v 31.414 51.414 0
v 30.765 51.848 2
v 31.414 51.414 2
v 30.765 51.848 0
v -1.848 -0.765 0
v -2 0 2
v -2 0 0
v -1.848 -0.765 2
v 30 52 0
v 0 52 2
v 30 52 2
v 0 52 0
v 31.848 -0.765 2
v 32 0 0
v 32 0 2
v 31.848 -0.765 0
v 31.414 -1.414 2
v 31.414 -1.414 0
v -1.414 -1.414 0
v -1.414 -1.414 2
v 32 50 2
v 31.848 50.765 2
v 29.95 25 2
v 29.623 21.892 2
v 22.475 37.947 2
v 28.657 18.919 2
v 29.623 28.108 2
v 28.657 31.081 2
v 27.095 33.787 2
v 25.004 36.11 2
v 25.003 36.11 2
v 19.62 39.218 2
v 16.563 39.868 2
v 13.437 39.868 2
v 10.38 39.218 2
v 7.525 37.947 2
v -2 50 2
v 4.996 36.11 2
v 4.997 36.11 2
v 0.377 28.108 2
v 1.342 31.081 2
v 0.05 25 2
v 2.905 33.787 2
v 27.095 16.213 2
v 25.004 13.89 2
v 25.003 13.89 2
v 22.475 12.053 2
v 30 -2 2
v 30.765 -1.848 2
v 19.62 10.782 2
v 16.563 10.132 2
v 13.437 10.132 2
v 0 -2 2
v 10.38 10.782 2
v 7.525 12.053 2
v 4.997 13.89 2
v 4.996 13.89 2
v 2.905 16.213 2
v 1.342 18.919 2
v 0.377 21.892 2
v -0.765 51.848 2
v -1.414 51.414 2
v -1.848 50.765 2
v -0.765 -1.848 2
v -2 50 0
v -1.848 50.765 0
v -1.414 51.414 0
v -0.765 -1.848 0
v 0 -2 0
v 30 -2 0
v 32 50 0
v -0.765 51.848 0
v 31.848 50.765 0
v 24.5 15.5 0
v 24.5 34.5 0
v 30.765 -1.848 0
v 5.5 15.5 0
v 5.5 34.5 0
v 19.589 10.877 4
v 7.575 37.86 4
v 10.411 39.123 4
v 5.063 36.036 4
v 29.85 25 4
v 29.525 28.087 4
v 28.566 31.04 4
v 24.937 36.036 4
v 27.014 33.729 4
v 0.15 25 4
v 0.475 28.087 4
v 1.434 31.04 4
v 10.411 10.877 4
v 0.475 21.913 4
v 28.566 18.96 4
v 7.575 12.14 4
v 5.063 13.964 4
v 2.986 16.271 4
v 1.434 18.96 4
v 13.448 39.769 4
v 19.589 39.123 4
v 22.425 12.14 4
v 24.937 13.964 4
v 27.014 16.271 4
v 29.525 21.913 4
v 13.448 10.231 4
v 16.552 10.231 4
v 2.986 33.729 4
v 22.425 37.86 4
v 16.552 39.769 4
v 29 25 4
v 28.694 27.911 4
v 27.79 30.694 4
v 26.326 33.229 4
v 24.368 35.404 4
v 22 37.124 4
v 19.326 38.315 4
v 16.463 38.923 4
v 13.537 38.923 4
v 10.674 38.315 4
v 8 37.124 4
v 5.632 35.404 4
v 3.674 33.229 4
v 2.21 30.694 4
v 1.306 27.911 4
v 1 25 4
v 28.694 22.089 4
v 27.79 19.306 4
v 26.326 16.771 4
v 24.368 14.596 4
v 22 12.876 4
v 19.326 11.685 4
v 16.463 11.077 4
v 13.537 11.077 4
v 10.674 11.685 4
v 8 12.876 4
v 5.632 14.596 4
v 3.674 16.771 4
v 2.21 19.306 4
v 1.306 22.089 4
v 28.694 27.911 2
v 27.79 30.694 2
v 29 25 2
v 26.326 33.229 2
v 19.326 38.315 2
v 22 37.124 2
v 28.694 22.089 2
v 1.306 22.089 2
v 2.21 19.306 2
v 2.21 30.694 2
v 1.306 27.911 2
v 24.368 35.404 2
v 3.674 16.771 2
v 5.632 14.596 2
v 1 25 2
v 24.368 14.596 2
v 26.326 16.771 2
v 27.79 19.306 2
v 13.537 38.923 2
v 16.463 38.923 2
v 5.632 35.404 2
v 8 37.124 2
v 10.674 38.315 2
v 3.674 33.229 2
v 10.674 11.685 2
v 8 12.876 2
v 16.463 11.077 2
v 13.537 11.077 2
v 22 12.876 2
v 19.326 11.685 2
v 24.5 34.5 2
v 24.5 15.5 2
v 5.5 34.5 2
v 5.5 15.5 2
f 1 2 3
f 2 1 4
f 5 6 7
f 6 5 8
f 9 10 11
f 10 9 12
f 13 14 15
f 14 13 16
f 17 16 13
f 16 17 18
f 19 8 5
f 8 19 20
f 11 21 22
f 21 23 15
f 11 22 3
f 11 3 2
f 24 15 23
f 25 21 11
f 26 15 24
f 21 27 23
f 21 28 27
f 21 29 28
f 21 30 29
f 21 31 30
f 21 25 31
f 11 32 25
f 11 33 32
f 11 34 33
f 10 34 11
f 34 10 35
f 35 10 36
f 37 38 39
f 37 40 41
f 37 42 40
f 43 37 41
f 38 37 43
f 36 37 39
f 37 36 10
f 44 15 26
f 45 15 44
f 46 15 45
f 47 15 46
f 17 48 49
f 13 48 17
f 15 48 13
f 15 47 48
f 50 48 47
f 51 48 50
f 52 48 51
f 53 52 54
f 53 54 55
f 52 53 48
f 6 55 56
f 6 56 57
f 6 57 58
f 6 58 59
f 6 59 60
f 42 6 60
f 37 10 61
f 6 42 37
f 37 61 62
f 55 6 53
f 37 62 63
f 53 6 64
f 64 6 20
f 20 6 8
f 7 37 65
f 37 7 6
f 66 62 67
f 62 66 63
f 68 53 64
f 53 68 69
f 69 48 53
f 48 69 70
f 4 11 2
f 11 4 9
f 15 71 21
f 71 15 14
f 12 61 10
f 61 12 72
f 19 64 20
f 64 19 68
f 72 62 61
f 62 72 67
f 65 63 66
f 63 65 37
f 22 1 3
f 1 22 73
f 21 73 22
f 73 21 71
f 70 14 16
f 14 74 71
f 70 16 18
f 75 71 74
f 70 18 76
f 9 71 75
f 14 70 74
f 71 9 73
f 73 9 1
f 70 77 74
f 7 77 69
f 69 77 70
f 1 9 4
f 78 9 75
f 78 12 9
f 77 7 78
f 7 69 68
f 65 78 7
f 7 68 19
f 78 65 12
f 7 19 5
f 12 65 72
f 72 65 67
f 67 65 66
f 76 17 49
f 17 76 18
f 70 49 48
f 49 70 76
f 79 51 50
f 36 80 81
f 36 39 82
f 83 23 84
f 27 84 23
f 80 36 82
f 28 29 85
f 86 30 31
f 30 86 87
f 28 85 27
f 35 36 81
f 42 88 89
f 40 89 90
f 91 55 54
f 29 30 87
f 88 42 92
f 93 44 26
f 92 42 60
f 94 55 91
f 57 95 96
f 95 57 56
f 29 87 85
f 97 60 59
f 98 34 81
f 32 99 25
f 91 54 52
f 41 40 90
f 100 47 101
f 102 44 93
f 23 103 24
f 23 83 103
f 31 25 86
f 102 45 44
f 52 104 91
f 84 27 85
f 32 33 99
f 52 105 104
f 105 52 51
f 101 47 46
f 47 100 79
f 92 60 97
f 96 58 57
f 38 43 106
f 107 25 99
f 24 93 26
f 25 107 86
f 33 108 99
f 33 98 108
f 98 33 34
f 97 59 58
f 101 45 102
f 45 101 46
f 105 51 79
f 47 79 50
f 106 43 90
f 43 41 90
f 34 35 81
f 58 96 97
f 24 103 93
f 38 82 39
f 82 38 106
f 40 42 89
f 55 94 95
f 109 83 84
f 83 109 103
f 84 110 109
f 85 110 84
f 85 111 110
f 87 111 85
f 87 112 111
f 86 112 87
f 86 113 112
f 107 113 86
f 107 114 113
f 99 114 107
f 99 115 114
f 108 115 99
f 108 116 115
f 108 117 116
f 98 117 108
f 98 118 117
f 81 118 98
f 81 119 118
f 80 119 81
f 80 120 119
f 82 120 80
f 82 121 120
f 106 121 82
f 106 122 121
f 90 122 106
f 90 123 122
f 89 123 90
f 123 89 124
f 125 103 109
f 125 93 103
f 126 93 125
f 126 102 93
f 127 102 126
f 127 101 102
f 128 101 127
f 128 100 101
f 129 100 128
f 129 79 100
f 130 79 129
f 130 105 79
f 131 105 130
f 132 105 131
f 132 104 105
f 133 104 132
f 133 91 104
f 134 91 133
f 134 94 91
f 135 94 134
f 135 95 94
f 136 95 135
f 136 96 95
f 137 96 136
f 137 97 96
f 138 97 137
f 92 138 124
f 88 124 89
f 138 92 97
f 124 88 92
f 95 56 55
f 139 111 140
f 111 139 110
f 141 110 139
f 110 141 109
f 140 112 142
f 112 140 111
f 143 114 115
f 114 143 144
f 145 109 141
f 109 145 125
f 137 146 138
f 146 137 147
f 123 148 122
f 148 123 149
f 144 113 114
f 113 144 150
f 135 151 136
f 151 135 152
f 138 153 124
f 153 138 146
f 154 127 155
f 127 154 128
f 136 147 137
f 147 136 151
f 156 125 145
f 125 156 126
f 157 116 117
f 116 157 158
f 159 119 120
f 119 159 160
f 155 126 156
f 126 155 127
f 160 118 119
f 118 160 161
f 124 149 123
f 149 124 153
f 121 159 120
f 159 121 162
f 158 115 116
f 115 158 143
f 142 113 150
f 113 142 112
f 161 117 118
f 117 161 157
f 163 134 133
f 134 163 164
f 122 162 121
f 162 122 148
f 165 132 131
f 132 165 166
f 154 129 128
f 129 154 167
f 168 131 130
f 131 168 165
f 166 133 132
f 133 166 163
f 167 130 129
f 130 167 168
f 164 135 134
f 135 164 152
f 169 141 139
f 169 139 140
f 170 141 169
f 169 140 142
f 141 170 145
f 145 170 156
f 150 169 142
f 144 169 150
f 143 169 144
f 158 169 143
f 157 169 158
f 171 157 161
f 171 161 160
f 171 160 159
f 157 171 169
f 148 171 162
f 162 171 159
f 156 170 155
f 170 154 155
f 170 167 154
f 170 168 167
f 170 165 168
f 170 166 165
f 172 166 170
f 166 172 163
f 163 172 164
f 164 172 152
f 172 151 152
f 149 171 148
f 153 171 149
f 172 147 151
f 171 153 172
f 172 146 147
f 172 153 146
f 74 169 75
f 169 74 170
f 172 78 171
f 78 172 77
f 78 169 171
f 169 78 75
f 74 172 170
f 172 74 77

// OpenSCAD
difference(){
    union() {
        minkowski(){
            cube([30,50,1]);
            cylinder(h=1,r=2, $fn=16);
        }
        translate([15,25,1.9999])
            cylinder(h=2,d1=29.9, d2=29.7);
    }
    translate([15,25,1.9999])
    {
        cylinder(h=3,d=28);
        cube([19,19,19],center=true);
    }
}
